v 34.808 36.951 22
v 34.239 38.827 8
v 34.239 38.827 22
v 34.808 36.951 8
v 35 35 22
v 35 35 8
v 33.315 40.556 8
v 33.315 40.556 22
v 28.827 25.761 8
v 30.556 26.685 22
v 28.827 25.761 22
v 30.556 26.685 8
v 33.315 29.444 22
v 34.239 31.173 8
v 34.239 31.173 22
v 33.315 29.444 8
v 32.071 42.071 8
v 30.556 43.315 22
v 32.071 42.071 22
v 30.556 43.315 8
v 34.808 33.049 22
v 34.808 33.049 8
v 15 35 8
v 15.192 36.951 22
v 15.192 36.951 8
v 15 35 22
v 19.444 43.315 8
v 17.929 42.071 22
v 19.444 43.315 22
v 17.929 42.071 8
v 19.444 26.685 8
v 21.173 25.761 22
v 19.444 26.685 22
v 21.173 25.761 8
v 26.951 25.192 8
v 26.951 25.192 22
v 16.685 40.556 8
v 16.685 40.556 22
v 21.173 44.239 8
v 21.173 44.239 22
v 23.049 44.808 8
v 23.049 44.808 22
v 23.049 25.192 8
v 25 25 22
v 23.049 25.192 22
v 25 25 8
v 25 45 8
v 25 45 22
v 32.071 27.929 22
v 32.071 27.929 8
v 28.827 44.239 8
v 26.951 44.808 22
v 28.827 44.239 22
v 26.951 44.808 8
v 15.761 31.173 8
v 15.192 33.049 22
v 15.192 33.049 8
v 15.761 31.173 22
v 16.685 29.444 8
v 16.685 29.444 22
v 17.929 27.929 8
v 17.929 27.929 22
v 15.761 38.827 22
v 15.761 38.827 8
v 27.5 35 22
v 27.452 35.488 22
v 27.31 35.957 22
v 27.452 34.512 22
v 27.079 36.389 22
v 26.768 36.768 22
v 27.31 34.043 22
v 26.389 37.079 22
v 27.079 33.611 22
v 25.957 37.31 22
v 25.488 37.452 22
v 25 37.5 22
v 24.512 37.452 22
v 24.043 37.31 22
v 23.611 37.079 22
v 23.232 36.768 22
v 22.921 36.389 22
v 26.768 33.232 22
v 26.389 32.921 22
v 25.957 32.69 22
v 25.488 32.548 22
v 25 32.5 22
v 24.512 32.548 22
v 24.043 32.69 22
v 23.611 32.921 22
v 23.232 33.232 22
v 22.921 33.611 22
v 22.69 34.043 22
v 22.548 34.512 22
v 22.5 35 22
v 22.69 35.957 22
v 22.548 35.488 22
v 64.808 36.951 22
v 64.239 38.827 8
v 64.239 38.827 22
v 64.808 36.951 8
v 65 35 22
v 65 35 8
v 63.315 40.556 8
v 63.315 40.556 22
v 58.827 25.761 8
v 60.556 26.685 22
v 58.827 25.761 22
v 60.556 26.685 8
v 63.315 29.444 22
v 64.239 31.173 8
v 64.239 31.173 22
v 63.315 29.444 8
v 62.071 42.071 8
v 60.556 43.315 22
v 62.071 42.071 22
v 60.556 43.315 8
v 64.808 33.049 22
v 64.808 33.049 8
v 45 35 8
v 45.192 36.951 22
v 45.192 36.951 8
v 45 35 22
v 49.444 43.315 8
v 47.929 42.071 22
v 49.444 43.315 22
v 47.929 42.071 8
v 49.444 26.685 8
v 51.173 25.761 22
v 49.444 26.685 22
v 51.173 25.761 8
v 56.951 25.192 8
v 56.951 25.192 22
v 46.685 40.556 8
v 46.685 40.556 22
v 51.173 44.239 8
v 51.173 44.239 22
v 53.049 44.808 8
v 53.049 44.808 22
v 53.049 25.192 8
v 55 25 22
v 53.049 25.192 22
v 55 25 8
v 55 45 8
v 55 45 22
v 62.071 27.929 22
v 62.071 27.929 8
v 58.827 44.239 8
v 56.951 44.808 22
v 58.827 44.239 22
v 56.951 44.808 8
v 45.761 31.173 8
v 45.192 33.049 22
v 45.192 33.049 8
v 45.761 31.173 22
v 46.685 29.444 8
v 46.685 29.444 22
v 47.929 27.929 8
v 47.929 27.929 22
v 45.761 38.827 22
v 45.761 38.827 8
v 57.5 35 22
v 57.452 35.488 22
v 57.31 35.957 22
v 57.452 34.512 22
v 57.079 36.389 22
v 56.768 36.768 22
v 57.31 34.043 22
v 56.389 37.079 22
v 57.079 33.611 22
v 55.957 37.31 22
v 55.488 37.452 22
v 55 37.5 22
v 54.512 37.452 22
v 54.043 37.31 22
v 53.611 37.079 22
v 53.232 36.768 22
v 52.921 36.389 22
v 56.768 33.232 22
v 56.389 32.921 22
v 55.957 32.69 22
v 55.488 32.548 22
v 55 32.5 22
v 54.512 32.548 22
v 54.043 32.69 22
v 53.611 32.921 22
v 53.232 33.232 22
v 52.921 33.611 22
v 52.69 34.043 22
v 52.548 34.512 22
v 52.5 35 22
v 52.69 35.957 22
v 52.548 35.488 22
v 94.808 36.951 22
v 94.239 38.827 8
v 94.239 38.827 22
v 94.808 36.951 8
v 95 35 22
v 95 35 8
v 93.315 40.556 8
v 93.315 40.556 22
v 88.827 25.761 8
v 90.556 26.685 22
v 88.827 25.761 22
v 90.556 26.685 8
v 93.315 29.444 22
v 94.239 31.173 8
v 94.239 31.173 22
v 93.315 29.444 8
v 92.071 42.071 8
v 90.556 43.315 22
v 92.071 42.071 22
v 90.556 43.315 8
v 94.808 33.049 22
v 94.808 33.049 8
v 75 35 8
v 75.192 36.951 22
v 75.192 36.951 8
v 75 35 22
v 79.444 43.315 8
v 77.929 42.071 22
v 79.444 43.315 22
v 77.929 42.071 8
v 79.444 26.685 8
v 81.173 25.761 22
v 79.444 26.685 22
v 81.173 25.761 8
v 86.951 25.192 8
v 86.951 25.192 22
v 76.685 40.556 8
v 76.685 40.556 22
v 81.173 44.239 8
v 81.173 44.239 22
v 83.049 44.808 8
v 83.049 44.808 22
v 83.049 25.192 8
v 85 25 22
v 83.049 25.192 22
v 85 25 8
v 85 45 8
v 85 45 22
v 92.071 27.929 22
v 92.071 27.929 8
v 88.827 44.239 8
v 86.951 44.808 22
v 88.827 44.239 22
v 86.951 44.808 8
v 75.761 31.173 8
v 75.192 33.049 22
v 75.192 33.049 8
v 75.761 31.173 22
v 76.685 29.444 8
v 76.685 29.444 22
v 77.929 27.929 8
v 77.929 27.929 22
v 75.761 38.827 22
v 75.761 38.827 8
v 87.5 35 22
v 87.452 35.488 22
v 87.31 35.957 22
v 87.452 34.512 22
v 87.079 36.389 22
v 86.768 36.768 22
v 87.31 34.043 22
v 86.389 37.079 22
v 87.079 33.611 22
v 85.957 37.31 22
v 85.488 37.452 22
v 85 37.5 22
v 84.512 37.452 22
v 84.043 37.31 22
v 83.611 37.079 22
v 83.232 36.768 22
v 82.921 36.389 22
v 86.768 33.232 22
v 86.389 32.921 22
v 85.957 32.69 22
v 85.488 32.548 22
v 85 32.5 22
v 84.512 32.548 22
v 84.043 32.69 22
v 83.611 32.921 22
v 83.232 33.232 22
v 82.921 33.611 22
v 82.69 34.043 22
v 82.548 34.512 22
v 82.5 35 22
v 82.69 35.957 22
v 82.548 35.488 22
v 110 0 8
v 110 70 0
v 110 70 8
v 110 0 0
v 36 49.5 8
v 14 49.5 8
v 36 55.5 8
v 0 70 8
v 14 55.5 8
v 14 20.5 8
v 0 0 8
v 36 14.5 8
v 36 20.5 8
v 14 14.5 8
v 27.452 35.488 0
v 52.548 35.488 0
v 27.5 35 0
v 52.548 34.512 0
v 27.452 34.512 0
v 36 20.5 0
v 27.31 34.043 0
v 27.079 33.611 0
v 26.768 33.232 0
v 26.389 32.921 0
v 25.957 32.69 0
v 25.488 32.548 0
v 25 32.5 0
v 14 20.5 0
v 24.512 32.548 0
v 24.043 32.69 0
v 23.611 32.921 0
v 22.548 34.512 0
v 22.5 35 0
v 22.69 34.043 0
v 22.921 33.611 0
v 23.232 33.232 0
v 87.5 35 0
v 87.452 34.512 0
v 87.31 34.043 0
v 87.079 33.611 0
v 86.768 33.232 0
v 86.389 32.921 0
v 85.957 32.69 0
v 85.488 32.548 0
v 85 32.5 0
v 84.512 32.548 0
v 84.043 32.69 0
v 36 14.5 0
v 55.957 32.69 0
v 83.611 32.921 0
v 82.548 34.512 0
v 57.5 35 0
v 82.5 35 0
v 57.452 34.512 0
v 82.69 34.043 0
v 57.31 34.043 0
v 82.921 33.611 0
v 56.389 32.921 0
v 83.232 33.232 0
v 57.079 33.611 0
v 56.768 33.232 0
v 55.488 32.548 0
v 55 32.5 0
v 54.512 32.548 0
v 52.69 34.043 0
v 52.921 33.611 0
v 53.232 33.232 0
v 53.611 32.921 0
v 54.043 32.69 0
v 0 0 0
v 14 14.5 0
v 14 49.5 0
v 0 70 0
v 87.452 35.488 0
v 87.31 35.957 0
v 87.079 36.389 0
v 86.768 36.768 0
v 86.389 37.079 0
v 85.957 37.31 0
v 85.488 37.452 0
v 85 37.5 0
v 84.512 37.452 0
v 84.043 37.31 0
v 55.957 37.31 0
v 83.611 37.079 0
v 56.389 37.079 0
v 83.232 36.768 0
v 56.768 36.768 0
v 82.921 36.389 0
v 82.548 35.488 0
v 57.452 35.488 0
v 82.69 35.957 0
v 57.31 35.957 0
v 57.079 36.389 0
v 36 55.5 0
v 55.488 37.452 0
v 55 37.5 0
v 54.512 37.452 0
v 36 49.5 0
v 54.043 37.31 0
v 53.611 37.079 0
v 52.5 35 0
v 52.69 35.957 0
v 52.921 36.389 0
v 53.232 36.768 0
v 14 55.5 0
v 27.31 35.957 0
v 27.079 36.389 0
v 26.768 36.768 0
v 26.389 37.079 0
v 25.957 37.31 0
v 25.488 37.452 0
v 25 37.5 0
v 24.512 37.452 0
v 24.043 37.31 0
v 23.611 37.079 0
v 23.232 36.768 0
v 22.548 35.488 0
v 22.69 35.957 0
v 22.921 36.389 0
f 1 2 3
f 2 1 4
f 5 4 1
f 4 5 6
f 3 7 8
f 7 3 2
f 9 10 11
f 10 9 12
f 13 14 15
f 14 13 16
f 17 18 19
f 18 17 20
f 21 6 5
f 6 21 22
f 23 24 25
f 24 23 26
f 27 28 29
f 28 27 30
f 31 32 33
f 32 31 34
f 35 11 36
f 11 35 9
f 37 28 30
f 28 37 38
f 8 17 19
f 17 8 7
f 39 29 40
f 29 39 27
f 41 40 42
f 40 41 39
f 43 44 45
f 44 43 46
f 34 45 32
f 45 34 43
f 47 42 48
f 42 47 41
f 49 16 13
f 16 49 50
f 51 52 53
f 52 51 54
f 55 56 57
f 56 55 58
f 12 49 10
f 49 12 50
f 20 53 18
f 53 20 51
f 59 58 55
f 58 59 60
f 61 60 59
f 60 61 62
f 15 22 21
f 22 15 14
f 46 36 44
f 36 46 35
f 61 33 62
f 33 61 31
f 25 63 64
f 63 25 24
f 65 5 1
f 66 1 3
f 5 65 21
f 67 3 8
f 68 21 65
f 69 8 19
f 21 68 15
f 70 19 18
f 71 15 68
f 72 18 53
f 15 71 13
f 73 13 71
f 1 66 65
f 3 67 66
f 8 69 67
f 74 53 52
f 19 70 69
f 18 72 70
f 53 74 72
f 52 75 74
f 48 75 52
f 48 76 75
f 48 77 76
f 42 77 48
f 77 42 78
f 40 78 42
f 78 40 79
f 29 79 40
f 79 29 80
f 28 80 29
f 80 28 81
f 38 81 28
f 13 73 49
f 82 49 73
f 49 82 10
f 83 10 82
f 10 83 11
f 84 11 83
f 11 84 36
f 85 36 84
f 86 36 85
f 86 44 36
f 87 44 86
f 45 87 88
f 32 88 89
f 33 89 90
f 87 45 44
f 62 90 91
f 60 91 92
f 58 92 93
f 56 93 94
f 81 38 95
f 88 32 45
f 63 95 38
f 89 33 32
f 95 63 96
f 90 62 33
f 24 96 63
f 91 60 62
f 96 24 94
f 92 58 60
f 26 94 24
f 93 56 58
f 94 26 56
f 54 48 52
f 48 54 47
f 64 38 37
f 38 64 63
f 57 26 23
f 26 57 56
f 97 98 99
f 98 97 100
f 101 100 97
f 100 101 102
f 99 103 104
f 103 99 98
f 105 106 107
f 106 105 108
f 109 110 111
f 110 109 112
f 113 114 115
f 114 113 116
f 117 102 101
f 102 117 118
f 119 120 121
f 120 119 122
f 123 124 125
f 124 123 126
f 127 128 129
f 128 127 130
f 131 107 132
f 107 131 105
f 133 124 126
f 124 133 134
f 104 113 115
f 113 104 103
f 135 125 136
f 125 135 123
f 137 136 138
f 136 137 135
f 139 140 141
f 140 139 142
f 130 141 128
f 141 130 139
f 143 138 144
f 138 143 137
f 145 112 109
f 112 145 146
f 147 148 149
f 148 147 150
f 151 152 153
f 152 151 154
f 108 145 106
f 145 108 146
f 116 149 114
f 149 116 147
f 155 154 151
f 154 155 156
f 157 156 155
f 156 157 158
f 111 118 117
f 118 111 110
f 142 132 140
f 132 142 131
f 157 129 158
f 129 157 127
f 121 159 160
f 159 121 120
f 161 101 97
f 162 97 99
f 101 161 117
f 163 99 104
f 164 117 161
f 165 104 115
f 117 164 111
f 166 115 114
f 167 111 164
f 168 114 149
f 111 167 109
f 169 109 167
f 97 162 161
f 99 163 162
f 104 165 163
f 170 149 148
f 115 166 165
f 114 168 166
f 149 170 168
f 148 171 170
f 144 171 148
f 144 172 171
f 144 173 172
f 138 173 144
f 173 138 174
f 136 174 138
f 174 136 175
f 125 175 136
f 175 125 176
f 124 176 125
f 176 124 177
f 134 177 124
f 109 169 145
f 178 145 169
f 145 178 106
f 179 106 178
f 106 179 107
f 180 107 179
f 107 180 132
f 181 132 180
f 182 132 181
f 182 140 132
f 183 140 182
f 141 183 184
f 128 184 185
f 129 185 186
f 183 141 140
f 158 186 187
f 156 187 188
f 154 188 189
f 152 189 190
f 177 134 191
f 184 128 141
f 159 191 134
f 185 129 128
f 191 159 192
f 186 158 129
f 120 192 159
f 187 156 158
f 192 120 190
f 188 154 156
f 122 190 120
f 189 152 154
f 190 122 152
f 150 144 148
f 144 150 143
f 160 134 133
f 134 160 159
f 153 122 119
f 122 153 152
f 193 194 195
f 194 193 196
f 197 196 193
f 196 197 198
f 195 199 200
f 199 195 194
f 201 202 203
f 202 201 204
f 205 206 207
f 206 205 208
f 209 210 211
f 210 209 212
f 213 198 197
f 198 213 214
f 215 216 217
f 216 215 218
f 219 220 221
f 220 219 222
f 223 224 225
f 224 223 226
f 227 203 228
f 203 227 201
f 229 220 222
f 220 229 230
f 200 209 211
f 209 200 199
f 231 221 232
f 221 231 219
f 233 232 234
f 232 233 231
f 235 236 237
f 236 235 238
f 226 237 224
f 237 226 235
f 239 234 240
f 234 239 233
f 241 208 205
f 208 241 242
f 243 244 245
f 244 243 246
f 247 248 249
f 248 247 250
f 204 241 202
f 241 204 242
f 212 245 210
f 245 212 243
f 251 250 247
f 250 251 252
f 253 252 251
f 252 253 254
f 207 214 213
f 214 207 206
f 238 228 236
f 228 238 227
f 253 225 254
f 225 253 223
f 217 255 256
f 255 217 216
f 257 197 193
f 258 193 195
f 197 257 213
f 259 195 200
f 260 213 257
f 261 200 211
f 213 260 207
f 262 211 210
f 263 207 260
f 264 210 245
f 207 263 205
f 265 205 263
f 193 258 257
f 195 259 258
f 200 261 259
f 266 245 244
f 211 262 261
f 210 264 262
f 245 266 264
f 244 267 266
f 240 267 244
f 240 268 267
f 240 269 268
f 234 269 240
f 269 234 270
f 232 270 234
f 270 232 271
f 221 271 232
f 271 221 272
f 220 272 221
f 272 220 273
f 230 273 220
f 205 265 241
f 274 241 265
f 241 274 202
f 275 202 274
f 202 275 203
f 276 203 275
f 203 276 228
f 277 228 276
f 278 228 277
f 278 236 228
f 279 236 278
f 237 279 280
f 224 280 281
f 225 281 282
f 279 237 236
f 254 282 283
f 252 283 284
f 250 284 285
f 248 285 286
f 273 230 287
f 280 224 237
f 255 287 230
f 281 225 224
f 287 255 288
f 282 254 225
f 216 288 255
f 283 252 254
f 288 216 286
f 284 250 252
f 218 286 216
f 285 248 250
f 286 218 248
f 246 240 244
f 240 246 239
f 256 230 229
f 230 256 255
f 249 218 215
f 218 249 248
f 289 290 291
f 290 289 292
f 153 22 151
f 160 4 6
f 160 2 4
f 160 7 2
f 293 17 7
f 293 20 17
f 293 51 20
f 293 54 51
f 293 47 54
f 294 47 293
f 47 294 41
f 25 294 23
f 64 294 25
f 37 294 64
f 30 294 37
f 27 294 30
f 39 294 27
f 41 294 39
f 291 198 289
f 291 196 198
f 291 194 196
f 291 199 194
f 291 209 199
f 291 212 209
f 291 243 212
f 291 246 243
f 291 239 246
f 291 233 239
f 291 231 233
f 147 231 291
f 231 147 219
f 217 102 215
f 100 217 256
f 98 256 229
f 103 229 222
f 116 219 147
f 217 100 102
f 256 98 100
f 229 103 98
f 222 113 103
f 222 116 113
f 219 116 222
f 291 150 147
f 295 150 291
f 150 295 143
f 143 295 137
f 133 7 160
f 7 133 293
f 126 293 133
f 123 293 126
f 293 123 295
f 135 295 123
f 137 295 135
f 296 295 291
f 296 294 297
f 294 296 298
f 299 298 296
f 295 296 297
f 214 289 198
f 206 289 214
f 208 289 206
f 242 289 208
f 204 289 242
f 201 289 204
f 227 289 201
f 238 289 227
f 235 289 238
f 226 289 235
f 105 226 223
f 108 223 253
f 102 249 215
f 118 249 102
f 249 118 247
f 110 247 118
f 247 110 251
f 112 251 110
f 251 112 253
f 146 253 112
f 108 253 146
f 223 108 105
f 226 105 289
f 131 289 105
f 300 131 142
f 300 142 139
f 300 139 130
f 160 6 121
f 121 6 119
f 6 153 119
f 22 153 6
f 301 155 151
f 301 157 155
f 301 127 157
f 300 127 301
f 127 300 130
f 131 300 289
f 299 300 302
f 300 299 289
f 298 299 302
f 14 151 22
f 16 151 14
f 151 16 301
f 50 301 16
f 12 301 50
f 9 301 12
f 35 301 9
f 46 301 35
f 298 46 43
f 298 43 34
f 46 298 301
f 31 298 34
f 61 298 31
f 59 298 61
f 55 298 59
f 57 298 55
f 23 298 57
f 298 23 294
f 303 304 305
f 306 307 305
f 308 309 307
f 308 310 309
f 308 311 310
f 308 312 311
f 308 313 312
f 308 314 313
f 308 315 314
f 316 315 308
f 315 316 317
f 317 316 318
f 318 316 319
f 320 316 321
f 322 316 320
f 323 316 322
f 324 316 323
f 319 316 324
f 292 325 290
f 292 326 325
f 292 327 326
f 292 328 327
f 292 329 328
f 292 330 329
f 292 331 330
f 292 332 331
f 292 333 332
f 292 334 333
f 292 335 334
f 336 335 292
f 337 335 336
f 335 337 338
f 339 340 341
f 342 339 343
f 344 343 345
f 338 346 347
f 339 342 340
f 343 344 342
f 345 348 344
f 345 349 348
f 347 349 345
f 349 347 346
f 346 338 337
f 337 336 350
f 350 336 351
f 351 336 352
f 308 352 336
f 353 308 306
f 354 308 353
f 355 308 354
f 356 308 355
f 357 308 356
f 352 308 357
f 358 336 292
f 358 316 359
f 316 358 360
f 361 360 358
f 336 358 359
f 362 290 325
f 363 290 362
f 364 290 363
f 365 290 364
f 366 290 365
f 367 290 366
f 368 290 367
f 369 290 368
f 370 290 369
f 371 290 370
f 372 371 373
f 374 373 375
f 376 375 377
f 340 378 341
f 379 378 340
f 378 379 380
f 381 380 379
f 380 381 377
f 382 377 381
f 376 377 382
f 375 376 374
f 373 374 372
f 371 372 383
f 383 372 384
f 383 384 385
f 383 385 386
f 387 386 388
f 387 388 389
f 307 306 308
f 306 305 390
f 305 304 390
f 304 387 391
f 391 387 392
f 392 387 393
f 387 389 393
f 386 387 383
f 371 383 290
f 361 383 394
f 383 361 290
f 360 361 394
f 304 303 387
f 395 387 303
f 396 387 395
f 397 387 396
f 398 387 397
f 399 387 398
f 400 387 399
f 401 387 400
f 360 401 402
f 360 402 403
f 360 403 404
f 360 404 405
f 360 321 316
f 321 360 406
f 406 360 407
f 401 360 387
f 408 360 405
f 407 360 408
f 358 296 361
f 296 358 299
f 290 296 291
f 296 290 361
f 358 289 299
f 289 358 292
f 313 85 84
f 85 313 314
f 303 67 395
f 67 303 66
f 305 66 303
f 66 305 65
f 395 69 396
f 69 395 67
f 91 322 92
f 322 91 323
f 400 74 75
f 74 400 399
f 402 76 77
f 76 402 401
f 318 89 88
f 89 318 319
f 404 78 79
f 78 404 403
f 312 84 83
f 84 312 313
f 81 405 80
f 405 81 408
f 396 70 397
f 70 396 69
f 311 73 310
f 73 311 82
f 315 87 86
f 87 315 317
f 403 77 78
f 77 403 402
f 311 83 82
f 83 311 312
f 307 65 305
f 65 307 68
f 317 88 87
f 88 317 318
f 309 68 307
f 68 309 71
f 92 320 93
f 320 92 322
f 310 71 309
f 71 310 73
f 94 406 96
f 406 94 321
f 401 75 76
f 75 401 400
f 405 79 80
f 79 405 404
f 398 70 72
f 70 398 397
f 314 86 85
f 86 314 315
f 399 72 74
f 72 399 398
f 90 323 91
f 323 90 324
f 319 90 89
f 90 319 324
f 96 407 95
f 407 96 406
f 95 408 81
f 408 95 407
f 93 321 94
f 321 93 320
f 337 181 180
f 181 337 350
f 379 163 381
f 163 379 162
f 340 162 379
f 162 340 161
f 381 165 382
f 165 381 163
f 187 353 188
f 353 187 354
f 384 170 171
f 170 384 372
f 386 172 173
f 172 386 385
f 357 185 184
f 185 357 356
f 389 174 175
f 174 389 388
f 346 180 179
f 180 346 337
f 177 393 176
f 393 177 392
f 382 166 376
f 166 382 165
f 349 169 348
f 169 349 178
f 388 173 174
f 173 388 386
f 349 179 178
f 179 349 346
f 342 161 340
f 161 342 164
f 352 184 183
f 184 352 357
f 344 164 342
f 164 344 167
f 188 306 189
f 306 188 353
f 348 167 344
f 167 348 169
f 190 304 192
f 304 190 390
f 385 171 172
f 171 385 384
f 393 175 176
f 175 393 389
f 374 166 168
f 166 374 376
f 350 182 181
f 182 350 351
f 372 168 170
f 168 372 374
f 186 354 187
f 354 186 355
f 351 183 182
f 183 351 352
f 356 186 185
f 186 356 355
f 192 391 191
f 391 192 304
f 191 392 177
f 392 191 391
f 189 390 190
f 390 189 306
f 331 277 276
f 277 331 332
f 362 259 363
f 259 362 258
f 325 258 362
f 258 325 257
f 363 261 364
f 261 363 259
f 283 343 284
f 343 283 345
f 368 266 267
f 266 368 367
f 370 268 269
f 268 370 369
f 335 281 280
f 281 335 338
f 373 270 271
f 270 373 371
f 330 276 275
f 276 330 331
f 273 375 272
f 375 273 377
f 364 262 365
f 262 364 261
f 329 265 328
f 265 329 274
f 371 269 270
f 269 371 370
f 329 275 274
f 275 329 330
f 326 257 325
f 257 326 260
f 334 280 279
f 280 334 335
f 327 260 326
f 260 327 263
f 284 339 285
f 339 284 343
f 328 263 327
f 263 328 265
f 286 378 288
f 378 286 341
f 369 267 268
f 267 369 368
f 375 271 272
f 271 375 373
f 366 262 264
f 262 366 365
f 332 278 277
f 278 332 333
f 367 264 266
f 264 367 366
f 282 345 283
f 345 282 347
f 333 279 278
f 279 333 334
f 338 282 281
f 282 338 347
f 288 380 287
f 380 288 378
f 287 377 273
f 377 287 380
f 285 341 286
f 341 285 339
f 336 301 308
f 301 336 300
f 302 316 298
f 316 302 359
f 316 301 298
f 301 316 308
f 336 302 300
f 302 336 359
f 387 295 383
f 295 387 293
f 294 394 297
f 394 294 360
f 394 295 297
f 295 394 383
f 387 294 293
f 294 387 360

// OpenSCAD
$fn = 32;

// ----------------------------------------------------------------------
// Drill jig: three_boss_slot jig
// ----------------------------------------------------------------------

// --- parameters (mm) ---
plate_l = 110;            // plate length, X
plate_w = 70;             // plate width, Y
plate_t = 8;              // plate thickness
boss_d = 20;              // guide boss diameter
boss_h = 15;              // boss height above the plate
guide_d = 5;              // guide hole diameter
boss_pitch = 30;          // boss pitch
slot_w = 6;               // clamp slot width
slot_l = 22;              // clamp slot length
slot_x = 14;              // slot start X

n_boss = 3;  // guide bosses
boss_x0 = (plate_l - (n_boss - 1) * boss_pitch) / 2;  // first boss X
boss_top = plate_t - 1 + boss_h;  // boss crown height
total_h = boss_top;  // overall height

difference() {
  union() {
  cube([plate_l, plate_w, plate_t]);
  for (i = [0 : n_boss - 1])
    translate([boss_x0 + i * boss_pitch, plate_w / 2, plate_t - 1])
      cylinder(h = boss_h, d = boss_d);
  }
  for (i = [0 : n_boss - 1])
    translate([boss_x0 + i * boss_pitch, plate_w / 2, -1])
      cylinder(h = plate_t + boss_h, d = guide_d);
  for (cy = [plate_w * 0.25, plate_w * 0.75])
    translate([slot_x, cy - slot_w / 2, -1])
      cube([slot_l, slot_w, plate_t + 2]);
}
